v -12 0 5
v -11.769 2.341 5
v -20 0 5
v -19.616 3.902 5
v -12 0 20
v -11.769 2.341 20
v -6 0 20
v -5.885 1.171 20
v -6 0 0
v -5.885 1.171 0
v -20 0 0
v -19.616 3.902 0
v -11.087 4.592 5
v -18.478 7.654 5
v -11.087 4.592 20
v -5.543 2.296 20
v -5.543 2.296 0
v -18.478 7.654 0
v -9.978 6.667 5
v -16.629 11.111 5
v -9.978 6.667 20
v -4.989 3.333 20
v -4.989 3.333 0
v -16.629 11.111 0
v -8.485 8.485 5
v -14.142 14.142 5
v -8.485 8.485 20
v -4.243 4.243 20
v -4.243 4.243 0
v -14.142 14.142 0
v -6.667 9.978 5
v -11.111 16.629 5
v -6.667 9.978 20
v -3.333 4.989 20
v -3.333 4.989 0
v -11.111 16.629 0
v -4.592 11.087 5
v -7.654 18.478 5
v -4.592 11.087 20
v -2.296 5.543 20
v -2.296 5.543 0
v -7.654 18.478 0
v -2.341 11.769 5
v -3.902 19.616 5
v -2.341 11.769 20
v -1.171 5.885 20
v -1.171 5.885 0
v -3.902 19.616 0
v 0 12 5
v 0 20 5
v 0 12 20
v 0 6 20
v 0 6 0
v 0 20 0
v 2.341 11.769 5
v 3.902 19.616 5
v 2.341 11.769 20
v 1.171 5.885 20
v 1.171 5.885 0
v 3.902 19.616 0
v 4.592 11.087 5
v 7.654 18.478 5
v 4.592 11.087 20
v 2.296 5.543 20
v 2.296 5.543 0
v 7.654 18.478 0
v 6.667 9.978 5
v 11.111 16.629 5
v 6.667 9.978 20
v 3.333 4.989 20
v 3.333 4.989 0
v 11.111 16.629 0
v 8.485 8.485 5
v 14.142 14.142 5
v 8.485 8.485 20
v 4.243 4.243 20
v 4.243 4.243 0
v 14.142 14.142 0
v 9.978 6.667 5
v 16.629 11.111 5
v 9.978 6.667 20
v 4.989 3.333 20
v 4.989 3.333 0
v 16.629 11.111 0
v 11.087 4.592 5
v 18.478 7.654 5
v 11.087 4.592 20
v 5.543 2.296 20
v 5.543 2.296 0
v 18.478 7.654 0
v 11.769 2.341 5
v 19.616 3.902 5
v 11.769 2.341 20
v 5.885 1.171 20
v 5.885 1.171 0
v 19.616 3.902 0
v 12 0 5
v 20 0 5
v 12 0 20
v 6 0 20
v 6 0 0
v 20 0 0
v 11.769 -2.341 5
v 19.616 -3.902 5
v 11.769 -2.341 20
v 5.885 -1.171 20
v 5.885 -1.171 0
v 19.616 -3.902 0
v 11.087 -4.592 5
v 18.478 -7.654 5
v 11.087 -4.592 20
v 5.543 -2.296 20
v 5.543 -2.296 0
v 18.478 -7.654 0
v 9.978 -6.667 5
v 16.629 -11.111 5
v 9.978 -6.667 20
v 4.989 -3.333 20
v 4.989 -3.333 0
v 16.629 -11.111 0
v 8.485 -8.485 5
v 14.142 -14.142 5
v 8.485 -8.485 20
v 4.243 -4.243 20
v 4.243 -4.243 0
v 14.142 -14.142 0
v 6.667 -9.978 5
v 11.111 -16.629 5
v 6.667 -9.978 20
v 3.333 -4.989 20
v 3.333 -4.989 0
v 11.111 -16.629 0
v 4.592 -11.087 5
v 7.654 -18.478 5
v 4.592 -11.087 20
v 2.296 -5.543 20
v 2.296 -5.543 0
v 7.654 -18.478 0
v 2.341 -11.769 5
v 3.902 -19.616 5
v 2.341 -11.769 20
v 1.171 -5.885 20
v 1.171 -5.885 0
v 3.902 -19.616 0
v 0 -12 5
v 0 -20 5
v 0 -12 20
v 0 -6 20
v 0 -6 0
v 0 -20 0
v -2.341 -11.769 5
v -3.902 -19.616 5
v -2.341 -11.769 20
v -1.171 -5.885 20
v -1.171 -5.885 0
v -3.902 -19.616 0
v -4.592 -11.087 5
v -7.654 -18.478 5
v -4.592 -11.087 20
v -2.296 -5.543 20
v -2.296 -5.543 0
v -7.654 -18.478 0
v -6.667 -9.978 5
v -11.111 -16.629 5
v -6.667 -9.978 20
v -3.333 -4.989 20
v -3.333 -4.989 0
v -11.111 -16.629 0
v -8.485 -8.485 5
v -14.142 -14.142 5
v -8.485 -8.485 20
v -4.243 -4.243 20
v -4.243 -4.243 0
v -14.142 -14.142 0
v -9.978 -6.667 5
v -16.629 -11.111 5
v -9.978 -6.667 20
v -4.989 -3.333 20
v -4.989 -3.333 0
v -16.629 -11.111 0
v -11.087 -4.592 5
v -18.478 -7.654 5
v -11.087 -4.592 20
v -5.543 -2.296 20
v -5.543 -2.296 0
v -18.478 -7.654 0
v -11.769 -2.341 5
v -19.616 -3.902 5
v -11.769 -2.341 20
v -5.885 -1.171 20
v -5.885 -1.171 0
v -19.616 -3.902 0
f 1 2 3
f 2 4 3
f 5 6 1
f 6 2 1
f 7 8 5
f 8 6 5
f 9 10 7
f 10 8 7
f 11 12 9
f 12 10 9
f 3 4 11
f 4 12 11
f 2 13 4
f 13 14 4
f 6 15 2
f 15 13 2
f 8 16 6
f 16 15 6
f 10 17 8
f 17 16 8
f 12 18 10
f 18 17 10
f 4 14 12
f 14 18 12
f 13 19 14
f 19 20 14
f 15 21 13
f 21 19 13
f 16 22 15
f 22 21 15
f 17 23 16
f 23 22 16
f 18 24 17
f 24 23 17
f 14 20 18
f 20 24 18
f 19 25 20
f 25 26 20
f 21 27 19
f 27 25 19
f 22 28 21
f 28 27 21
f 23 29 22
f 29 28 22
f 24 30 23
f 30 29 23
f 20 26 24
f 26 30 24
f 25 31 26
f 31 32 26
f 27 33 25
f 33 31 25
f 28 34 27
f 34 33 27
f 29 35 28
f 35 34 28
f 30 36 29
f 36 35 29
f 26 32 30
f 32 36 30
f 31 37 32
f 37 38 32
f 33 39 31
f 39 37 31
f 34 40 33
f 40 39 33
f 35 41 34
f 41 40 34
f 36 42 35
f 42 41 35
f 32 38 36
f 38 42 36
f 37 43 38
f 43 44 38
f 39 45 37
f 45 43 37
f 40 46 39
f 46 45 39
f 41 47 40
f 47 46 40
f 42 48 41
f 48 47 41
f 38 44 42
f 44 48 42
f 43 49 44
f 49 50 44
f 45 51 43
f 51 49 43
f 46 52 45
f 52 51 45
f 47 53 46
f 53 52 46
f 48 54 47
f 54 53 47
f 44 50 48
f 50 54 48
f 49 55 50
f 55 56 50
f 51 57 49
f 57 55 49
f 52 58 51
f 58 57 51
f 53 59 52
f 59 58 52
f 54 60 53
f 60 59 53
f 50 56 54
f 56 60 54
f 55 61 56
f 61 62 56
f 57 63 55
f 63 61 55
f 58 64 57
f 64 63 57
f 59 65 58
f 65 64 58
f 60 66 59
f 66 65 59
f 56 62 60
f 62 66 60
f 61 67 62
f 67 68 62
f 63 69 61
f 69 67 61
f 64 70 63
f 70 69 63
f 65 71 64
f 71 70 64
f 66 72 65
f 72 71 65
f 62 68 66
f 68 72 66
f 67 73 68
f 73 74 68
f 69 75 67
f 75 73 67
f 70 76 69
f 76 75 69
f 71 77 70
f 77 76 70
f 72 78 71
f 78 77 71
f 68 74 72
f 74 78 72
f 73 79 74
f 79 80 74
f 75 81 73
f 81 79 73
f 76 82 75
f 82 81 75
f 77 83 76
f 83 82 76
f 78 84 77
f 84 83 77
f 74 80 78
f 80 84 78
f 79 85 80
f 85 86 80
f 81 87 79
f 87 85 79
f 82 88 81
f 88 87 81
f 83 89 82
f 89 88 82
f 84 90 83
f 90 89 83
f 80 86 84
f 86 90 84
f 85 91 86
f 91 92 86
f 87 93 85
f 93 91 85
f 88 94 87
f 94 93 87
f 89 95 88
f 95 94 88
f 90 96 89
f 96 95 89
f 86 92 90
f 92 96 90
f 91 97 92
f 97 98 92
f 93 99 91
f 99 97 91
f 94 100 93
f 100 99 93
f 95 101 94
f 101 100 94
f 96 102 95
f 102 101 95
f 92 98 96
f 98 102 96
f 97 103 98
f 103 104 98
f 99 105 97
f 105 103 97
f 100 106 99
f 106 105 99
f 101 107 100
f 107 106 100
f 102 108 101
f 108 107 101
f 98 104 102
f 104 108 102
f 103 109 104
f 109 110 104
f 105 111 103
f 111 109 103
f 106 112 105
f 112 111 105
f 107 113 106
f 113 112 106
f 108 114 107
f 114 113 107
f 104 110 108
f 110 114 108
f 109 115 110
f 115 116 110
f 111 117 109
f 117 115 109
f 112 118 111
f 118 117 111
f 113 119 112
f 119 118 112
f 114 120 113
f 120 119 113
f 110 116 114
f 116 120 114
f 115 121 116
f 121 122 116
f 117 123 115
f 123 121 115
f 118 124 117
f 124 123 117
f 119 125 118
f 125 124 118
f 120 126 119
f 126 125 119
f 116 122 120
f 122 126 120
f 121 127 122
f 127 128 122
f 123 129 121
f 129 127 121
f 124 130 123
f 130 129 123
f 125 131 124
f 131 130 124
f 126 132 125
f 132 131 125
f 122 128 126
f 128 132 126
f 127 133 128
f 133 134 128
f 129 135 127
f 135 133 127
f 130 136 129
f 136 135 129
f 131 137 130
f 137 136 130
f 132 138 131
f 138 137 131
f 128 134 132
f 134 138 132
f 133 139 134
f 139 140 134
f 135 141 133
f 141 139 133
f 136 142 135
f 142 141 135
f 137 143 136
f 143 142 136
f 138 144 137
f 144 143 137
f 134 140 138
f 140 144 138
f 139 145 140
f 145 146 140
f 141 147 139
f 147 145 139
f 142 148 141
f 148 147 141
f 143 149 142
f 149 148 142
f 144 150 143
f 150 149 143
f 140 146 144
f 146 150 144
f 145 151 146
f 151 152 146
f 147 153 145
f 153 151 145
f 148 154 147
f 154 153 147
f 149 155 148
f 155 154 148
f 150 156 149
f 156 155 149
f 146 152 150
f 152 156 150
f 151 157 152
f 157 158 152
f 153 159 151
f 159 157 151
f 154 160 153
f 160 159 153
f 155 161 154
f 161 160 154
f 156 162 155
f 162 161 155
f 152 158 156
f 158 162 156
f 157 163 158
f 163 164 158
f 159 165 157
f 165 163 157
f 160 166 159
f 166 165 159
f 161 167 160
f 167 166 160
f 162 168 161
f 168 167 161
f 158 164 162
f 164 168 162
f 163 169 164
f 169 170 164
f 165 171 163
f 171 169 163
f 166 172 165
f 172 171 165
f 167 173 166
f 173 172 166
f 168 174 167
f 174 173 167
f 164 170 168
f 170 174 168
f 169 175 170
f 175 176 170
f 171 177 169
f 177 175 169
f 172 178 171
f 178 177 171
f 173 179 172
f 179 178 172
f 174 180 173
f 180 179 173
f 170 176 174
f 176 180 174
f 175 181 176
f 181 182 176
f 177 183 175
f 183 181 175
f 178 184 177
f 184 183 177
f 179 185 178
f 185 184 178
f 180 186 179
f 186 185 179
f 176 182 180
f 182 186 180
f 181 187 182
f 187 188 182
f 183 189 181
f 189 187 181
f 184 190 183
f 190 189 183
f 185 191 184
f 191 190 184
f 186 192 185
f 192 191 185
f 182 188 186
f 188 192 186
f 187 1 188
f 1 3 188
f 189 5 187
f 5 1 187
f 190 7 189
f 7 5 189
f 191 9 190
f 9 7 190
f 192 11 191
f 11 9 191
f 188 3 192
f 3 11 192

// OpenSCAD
$fn = 32;

// ----------------------------------------------------------------------
// Revolved part: flanged bushing R20
// ----------------------------------------------------------------------

// --- parameters (mm) ---
bore_r = 6;               // bore radius
flange_r = 20;            // flange radius
flange_h = 5;             // flange thickness
sleeve_r = 12;            // sleeve radius
total_h = 20;             // overall height
revolve_angle = 360;      // revolve sweep, degrees
fit_tol = 0.05;           // declared fit tolerance (prompt contract)
free_tol = 0.2;           // declared free tolerance (prompt contract)

bore_d = 2 * bore_r;
flange_d = 2 * flange_r;
sleeve_d = 2 * sleeve_r;

profile = [[6, 0], [20, 0], [20, 5], [12, 5], [12, 20], [6, 20]];  // primary outline, 6 points, counter clockwise

// --- the one profile operation ---
rotate_extrude(angle = revolve_angle) polygon(points = profile);
